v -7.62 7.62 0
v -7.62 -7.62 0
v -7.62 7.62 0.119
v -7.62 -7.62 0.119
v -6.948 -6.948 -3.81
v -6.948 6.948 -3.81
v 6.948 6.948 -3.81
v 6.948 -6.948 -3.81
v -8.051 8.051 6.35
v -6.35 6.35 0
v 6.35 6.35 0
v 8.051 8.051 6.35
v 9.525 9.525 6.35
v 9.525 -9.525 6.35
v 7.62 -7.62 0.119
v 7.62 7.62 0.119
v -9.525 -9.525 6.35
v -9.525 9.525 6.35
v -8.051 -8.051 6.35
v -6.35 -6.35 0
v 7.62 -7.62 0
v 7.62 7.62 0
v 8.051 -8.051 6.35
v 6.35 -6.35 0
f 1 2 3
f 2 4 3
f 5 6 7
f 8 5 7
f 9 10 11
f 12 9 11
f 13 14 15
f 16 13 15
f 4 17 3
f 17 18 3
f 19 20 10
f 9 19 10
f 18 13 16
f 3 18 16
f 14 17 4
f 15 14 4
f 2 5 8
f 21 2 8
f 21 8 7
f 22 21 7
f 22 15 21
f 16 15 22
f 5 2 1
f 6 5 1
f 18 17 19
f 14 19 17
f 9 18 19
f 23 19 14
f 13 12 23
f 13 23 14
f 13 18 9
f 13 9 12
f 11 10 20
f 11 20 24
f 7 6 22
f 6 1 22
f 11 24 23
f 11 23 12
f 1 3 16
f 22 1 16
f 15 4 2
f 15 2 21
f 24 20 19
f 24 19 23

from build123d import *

# Parameters (mm, degrees)
F0_W          = 19.05
F0_H          = 19.05
F0_W_2        = 12.7
F0_H_2        = 12.7
F1_DEPTH      = 6.35
F2_W          = 15.24
F2_H          = 15.24
F3_DEPTH      = 3.81
F4_SIZE2      = 6.34999
F4_SIZE       = 1.701467
F5_T4_DEPTH   = 52.0165982025
F5_T10_DEPTH  = 52.0165982025
F5_T16_DEPTH  = 52.0165982025
F5_T23_DEPTH  = 52.0165982025
F5_T29_DEPTH  = 52.0165982025
F5_T35_DEPTH  = 52.0165982025
F5_T41_DEPTH  = 52.0165982025
F5_T47_DEPTH  = 52.0165982025
F5_T54_DEPTH  = 52.0165982025
F5_T60_DEPTH  = 52.0165982025
F5_T66_DEPTH  = 52.0165982025
F5_T72_DEPTH  = 52.0165982025
F5_T78_DEPTH  = 52.0165982025
F5_T85_DEPTH  = 52.0165982025
F5_T91_DEPTH  = 52.0165982025
F5_T97_DEPTH  = 52.0165982025
F5_T103_DEPTH = 52.0165982025
F5_T109_DEPTH = 52.0165982025
F5_T116_DEPTH = 52.0165982025
F5_T122_DEPTH = 52.0165982025
F6_C1_SIZE2   = 0.6718057965
F6_C1_SIZE    = 3.81
F6_C2_SIZE2   = 0.6718057965
F6_C2_SIZE    = 3.81
F6_C3_SIZE2   = 3.81
F6_C3_SIZE    = 0.6718057965
F6_C4_SIZE2   = 3.81
F6_C4_SIZE    = 0.6718057965


# Not quite as in the source:
# - a fillet or chamfer that OpenCascade refuses, or shapes differently, is made with other operations: its cross-section is extruded or revolved along the edge and cut away or added
# - a fillet or chamfer is up to 0.001 mm smaller than in the source, because OpenCascade refuses the exact size


with BuildPart() as f1:
    # F0 (on Top) → F1 (new body)
    with BuildSketch(Plane.XY):
        Rectangle(F0_W, F0_H)
        Rectangle(F0_W_2, F0_H_2, mode=Mode.SUBTRACT)
    extrude(amount=F1_DEPTH)

    # F2 (on Top) → F3 (join)
    with BuildSketch(Plane.XY):
        Rectangle(F2_W, F2_H)
    extrude(amount=-F3_DEPTH)

    # F4 (size 1.7014773719 and 6.35 in the source; OpenCascade refuses exactly that, so slightly less here)
    f4_edges = [f1.edges().sort_by_distance(p)[0] for p in [
        (0, 6.35, 6.35),
        (6.35, 0, 6.35),
        (0, -6.35, 6.35),
        (-6.35, 0, 6.35),
    ]]
    f4_side = f1.faces().sort_by_distance((9.255592, 0, 6.35))[0]
    chamfer(f4_edges, length=F4_SIZE, length2=F4_SIZE2, reference=f4_side)

    # F5: chamfer of 6.35 x 1.9413898273 on 4 edges, made by hand


with BuildPart() as f5_tool2:
    # F5_s3 → F5_t4 (new body)
    with BuildSketch(Plane.YZ.offset(26.0082991012)):
        Polygon((9.525, 6.35), (7.5836101727, 0), (9.525, 0), align=None)
    extrude(amount=-F5_T4_DEPTH)

    split(bisect_by=Plane.XZ.offset(-7.62), keep=Keep.BOTTOM)

    split(bisect_by=Plane.YZ.offset(7.62), keep=Keep.TOP)


with BuildPart() as f1_1:
    add(f1.part)

    # F5_t1: cut F5_tool2
    add(f5_tool2.part, mode=Mode.SUBTRACT)


with BuildPart() as f5_tool8:
    # F5_s9 → F5_t10 (new body)
    with BuildSketch(Plane.YZ.offset(26.0082991012)):
        Polygon((9.525, 6.35), (7.5836101727, 0), (9.525, 0), align=None)
    extrude(amount=-F5_T10_DEPTH)

    split(bisect_by=Plane.XZ.offset(-7.62), keep=Keep.TOP)

    split(bisect_by=Plane.YZ.offset(7.62), keep=Keep.TOP)


with BuildPart() as f1_2:
    add(f1_1.part)

    # F5_t7: cut F5_tool8
    add(f5_tool8.part, mode=Mode.SUBTRACT)


with BuildPart() as f5_tool14:
    # F5_s15 → F5_t16 (new body)
    with BuildSketch(Plane.YZ.offset(26.0082991012)):
        Polygon((9.525, 6.35), (7.5836101727, 0), (9.525, 0), align=None)
    extrude(amount=-F5_T16_DEPTH)

    split(bisect_by=Plane.XZ.offset(-7.62), keep=Keep.BOTTOM)

    split(bisect_by=Plane.YZ.offset(-7.62), keep=Keep.TOP)

    split(bisect_by=Plane.YZ.offset(7.62), keep=Keep.BOTTOM)


with BuildPart() as f1_3:
    add(f1_2.part)

    # F5_t13: cut F5_tool14
    add(f5_tool14.part, mode=Mode.SUBTRACT)


with BuildPart() as f5_tool21:
    # F5_s22 → F5_t23 (new body)
    with BuildSketch(Plane.YZ.offset(26.0082991012)):
        Polygon((9.525, 6.35), (7.5836101727, 0), (9.525, 0), align=None)
    extrude(amount=-F5_T23_DEPTH)

    split(bisect_by=Plane.XZ.offset(-7.62), keep=Keep.BOTTOM)

    split(bisect_by=Plane.YZ.offset(-7.62), keep=Keep.BOTTOM)


with BuildPart() as f1_4:
    add(f1_3.part)

    # F5_t20: cut F5_tool21
    add(f5_tool21.part, mode=Mode.SUBTRACT)


with BuildPart() as f5_tool27:
    # F5_s28 → F5_t29 (new body)
    with BuildSketch(Plane.YZ.offset(26.0082991012)):
        Polygon((9.525, 6.35), (7.5836101727, 0), (9.525, 0), align=None)
    extrude(amount=-F5_T29_DEPTH)

    split(bisect_by=Plane.XZ.offset(-7.62), keep=Keep.TOP)

    split(bisect_by=Plane.YZ.offset(-7.62), keep=Keep.BOTTOM)


with BuildPart() as f1_5:
    add(f1_4.part)

    # F5_t26: cut F5_tool27
    add(f5_tool27.part, mode=Mode.SUBTRACT)


with BuildPart() as f5_tool33:
    # F5_s34 → F5_t35 (new body)
    with BuildSketch(Plane.XZ.offset(26.0082991012)):
        Polygon((9.525, 6.35), (7.5836101727, 0), (9.525, 0), align=None)
    extrude(amount=-F5_T35_DEPTH)

    split(bisect_by=Plane.XZ.offset(7.62), keep=Keep.TOP)

    split(bisect_by=Plane.YZ.offset(7.62), keep=Keep.TOP)


with BuildPart() as f1_6:
    add(f1_5.part)

    # F5_t32: cut F5_tool33
    add(f5_tool33.part, mode=Mode.SUBTRACT)


with BuildPart() as f5_tool39:
    # F5_s40 → F5_t41 (new body)
    with BuildSketch(Plane.XZ.offset(26.0082991012)):
        Polygon((9.525, 6.35), (7.5836101727, 0), (9.525, 0), align=None)
    extrude(amount=-F5_T41_DEPTH)

    split(bisect_by=Plane.XZ.offset(7.62), keep=Keep.TOP)

    split(bisect_by=Plane.YZ.offset(7.62), keep=Keep.BOTTOM)


with BuildPart() as f1_7:
    add(f1_6.part)

    # F5_t38: cut F5_tool39
    add(f5_tool39.part, mode=Mode.SUBTRACT)


with BuildPart() as f5_tool45:
    # F5_s46 → F5_t47 (new body)
    with BuildSketch(Plane.XZ.offset(26.0082991012)):
        Polygon((9.525, 6.35), (7.5836101727, 0), (9.525, 0), align=None)
    extrude(amount=-F5_T47_DEPTH)

    split(bisect_by=Plane.XZ.offset(-7.62), keep=Keep.TOP)

    split(bisect_by=Plane.XZ.offset(7.62), keep=Keep.BOTTOM)

    split(bisect_by=Plane.YZ.offset(7.62), keep=Keep.TOP)


with BuildPart() as f1_8:
    add(f1_7.part)

    # F5_t44: cut F5_tool45
    add(f5_tool45.part, mode=Mode.SUBTRACT)


with BuildPart() as f5_tool52:
    # F5_s53 → F5_t54 (new body)
    with BuildSketch(Plane.XZ.offset(26.0082991012)):
        Polygon((9.525, 6.35), (7.5836101727, 0), (9.525, 0), align=None)
    extrude(amount=-F5_T54_DEPTH)

    split(bisect_by=Plane.XZ.offset(-7.62), keep=Keep.BOTTOM)

    split(bisect_by=Plane.YZ.offset(7.62), keep=Keep.TOP)


with BuildPart() as f1_9:
    add(f1_8.part)

    # F5_t51: cut F5_tool52
    add(f5_tool52.part, mode=Mode.SUBTRACT)


with BuildPart() as f5_tool58:
    # F5_s59 → F5_t60 (new body)
    with BuildSketch(Plane.XZ.offset(26.0082991012)):
        Polygon((9.525, 6.35), (7.5836101727, 0), (9.525, 0), align=None)
    extrude(amount=-F5_T60_DEPTH)

    split(bisect_by=Plane.XZ.offset(-7.62), keep=Keep.BOTTOM)

    split(bisect_by=Plane.YZ.offset(7.62), keep=Keep.BOTTOM)


with BuildPart() as f1_10:
    add(f1_9.part)

    # F5_t57: cut F5_tool58
    add(f5_tool58.part, mode=Mode.SUBTRACT)


with BuildPart() as f5_tool64:
    # F5_s65 → F5_t66 (new body)
    with BuildSketch(Plane.YZ.offset(-26.0082991012)):
        Polygon((-9.525, 6.35), (-7.5836101727, 0), (-9.525, 0), align=None)
    extrude(amount=F5_T66_DEPTH)

    split(bisect_by=Plane.YZ.offset(-7.62), keep=Keep.BOTTOM)

    split(bisect_by=Plane.XZ.offset(7.62), keep=Keep.TOP)


with BuildPart() as f1_11:
    add(f1_10.part)

    # F5_t63: cut F5_tool64
    add(f5_tool64.part, mode=Mode.SUBTRACT)


with BuildPart() as f5_tool70:
    # F5_s71 → F5_t72 (new body)
    with BuildSketch(Plane.YZ.offset(-26.0082991012)):
        Polygon((-9.525, 6.35), (-7.5836101727, 0), (-9.525, 0), align=None)
    extrude(amount=F5_T72_DEPTH)

    split(bisect_by=Plane.YZ.offset(-7.62), keep=Keep.BOTTOM)

    split(bisect_by=Plane.XZ.offset(7.62), keep=Keep.BOTTOM)


with BuildPart() as f1_12:
    add(f1_11.part)

    # F5_t69: cut F5_tool70
    add(f5_tool70.part, mode=Mode.SUBTRACT)


with BuildPart() as f5_tool76:
    # F5_s77 → F5_t78 (new body)
    with BuildSketch(Plane.YZ.offset(-26.0082991012)):
        Polygon((-9.525, 6.35), (-7.5836101727, 0), (-9.525, 0), align=None)
    extrude(amount=F5_T78_DEPTH)

    split(bisect_by=Plane.YZ.offset(-7.62), keep=Keep.TOP)

    split(bisect_by=Plane.XZ.offset(7.62), keep=Keep.TOP)

    split(bisect_by=Plane.YZ.offset(7.62), keep=Keep.BOTTOM)


with BuildPart() as f1_13:
    add(f1_12.part)

    # F5_t75: cut F5_tool76
    add(f5_tool76.part, mode=Mode.SUBTRACT)


with BuildPart() as f5_tool83:
    # F5_s84 → F5_t85 (new body)
    with BuildSketch(Plane.YZ.offset(-26.0082991012)):
        Polygon((-9.525, 6.35), (-7.5836101727, 0), (-9.525, 0), align=None)
    extrude(amount=F5_T85_DEPTH)

    split(bisect_by=Plane.XZ.offset(7.62), keep=Keep.TOP)

    split(bisect_by=Plane.YZ.offset(7.62), keep=Keep.TOP)


with BuildPart() as f1_14:
    add(f1_13.part)

    # F5_t82: cut F5_tool83
    add(f5_tool83.part, mode=Mode.SUBTRACT)


with BuildPart() as f5_tool89:
    # F5_s90 → F5_t91 (new body)
    with BuildSketch(Plane.YZ.offset(-26.0082991012)):
        Polygon((-9.525, 6.35), (-7.5836101727, 0), (-9.525, 0), align=None)
    extrude(amount=F5_T91_DEPTH)

    split(bisect_by=Plane.XZ.offset(7.62), keep=Keep.BOTTOM)

    split(bisect_by=Plane.YZ.offset(7.62), keep=Keep.TOP)


with BuildPart() as f1_15:
    add(f1_14.part)

    # F5_t88: cut F5_tool89
    add(f5_tool89.part, mode=Mode.SUBTRACT)


with BuildPart() as f5_tool95:
    # F5_s96 → F5_t97 (new body)
    with BuildSketch(Plane.XZ.offset(-26.0082991012)):
        Polygon((-9.525, 6.35), (-7.5836101727, 0), (-9.525, 0), align=None)
    extrude(amount=F5_T97_DEPTH)

    split(bisect_by=Plane.XZ.offset(-7.62), keep=Keep.BOTTOM)

    split(bisect_by=Plane.YZ.offset(-7.62), keep=Keep.BOTTOM)


with BuildPart() as f1_16:
    add(f1_15.part)

    # F5_t94: cut F5_tool95
    add(f5_tool95.part, mode=Mode.SUBTRACT)


with BuildPart() as f5_tool101:
    # F5_s102 → F5_t103 (new body)
    with BuildSketch(Plane.XZ.offset(-26.0082991012)):
        Polygon((-9.525, 6.35), (-7.5836101727, 0), (-9.525, 0), align=None)
    extrude(amount=F5_T103_DEPTH)

    split(bisect_by=Plane.XZ.offset(-7.62), keep=Keep.BOTTOM)

    split(bisect_by=Plane.YZ.offset(-7.62), keep=Keep.TOP)


with BuildPart() as f1_17:
    add(f1_16.part)

    # F5_t100: cut F5_tool101
    add(f5_tool101.part, mode=Mode.SUBTRACT)


with BuildPart() as f5_tool107:
    # F5_s108 → F5_t109 (new body)
    with BuildSketch(Plane.XZ.offset(-26.0082991012)):
        Polygon((-9.525, 6.35), (-7.5836101727, 0), (-9.525, 0), align=None)
    extrude(amount=F5_T109_DEPTH)

    split(bisect_by=Plane.XZ.offset(-7.62), keep=Keep.TOP)

    split(bisect_by=Plane.YZ.offset(-7.62), keep=Keep.BOTTOM)

    split(bisect_by=Plane.XZ.offset(7.62), keep=Keep.BOTTOM)


with BuildPart() as f1_18:
    add(f1_17.part)

    # F5_t106: cut F5_tool107
    add(f5_tool107.part, mode=Mode.SUBTRACT)


with BuildPart() as f5_tool114:
    # F5_s115 → F5_t116 (new body)
    with BuildSketch(Plane.XZ.offset(-26.0082991012)):
        Polygon((-9.525, 6.35), (-7.5836101727, 0), (-9.525, 0), align=None)
    extrude(amount=F5_T116_DEPTH)

    split(bisect_by=Plane.YZ.offset(-7.62), keep=Keep.BOTTOM)

    split(bisect_by=Plane.XZ.offset(7.62), keep=Keep.TOP)


with BuildPart() as f1_19:
    add(f1_18.part)

    # F5_t113: cut F5_tool114
    add(f5_tool114.part, mode=Mode.SUBTRACT)


with BuildPart() as f5_tool120:
    # F5_s121 → F5_t122 (new body)
    with BuildSketch(Plane.XZ.offset(-26.0082991012)):
        Polygon((-9.525, 6.35), (-7.5836101727, 0), (-9.525, 0), align=None)
    extrude(amount=F5_T122_DEPTH)

    split(bisect_by=Plane.YZ.offset(-7.62), keep=Keep.TOP)

    split(bisect_by=Plane.XZ.offset(7.62), keep=Keep.TOP)


with BuildPart() as f1_20:
    add(f1_19.part)

    # F5_t119: cut F5_tool120
    add(f5_tool120.part, mode=Mode.SUBTRACT)

    # F6: chamfer of 3.81 x 0.6718057965 on 4 edges, made by hand

    # F6_c1
    f6_c1_edges = [f1_20.edges().sort_by_distance(p)[0] for p in [
        (0, -7.62, -3.81),
    ]]
    f6_c1_side = f1_20.faces().sort_by_distance((0, -7.62, -3.7965638841))[0]
    chamfer(f6_c1_edges, length=F6_C1_SIZE, length2=F6_C1_SIZE2, reference=f6_c1_side)

    # F6_c2
    f6_c2_edges = [f1_20.edges().sort_by_distance(p)[0] for p in [
        (7.62, 0.3359028982, -3.81),
    ]]
    f6_c2_side = f1_20.faces().sort_by_distance((7.62, 0.3359028982, -3.7965638841))[0]
    chamfer(f6_c2_edges, length=F6_C2_SIZE, length2=F6_C2_SIZE2, reference=f6_c2_side)

    # F6_c3
    f6_c3_edges = [f1_20.edges().sort_by_distance(p)[0] for p in [
        (-0.3359028982, 7.62, -3.81),
    ]]
    f6_c3_side = f1_20.faces().sort_by_distance((-0.3359028982, 7.6065638841, -3.81))[0]
    chamfer(f6_c3_edges, length=F6_C3_SIZE, length2=F6_C3_SIZE2, reference=f6_c3_side)

    # F6_c4
    f6_c4_edges = [f1_20.edges().sort_by_distance(p)[0] for p in [
        (-7.62, 0, -3.81),
    ]]
    f6_c4_side = f1_20.faces().sort_by_distance((-7.6065638841, 0, -3.81))[0]
    chamfer(f6_c4_edges, length=F6_C4_SIZE, length2=F6_C4_SIZE2, reference=f6_c4_side)


solid = f1_20.part
